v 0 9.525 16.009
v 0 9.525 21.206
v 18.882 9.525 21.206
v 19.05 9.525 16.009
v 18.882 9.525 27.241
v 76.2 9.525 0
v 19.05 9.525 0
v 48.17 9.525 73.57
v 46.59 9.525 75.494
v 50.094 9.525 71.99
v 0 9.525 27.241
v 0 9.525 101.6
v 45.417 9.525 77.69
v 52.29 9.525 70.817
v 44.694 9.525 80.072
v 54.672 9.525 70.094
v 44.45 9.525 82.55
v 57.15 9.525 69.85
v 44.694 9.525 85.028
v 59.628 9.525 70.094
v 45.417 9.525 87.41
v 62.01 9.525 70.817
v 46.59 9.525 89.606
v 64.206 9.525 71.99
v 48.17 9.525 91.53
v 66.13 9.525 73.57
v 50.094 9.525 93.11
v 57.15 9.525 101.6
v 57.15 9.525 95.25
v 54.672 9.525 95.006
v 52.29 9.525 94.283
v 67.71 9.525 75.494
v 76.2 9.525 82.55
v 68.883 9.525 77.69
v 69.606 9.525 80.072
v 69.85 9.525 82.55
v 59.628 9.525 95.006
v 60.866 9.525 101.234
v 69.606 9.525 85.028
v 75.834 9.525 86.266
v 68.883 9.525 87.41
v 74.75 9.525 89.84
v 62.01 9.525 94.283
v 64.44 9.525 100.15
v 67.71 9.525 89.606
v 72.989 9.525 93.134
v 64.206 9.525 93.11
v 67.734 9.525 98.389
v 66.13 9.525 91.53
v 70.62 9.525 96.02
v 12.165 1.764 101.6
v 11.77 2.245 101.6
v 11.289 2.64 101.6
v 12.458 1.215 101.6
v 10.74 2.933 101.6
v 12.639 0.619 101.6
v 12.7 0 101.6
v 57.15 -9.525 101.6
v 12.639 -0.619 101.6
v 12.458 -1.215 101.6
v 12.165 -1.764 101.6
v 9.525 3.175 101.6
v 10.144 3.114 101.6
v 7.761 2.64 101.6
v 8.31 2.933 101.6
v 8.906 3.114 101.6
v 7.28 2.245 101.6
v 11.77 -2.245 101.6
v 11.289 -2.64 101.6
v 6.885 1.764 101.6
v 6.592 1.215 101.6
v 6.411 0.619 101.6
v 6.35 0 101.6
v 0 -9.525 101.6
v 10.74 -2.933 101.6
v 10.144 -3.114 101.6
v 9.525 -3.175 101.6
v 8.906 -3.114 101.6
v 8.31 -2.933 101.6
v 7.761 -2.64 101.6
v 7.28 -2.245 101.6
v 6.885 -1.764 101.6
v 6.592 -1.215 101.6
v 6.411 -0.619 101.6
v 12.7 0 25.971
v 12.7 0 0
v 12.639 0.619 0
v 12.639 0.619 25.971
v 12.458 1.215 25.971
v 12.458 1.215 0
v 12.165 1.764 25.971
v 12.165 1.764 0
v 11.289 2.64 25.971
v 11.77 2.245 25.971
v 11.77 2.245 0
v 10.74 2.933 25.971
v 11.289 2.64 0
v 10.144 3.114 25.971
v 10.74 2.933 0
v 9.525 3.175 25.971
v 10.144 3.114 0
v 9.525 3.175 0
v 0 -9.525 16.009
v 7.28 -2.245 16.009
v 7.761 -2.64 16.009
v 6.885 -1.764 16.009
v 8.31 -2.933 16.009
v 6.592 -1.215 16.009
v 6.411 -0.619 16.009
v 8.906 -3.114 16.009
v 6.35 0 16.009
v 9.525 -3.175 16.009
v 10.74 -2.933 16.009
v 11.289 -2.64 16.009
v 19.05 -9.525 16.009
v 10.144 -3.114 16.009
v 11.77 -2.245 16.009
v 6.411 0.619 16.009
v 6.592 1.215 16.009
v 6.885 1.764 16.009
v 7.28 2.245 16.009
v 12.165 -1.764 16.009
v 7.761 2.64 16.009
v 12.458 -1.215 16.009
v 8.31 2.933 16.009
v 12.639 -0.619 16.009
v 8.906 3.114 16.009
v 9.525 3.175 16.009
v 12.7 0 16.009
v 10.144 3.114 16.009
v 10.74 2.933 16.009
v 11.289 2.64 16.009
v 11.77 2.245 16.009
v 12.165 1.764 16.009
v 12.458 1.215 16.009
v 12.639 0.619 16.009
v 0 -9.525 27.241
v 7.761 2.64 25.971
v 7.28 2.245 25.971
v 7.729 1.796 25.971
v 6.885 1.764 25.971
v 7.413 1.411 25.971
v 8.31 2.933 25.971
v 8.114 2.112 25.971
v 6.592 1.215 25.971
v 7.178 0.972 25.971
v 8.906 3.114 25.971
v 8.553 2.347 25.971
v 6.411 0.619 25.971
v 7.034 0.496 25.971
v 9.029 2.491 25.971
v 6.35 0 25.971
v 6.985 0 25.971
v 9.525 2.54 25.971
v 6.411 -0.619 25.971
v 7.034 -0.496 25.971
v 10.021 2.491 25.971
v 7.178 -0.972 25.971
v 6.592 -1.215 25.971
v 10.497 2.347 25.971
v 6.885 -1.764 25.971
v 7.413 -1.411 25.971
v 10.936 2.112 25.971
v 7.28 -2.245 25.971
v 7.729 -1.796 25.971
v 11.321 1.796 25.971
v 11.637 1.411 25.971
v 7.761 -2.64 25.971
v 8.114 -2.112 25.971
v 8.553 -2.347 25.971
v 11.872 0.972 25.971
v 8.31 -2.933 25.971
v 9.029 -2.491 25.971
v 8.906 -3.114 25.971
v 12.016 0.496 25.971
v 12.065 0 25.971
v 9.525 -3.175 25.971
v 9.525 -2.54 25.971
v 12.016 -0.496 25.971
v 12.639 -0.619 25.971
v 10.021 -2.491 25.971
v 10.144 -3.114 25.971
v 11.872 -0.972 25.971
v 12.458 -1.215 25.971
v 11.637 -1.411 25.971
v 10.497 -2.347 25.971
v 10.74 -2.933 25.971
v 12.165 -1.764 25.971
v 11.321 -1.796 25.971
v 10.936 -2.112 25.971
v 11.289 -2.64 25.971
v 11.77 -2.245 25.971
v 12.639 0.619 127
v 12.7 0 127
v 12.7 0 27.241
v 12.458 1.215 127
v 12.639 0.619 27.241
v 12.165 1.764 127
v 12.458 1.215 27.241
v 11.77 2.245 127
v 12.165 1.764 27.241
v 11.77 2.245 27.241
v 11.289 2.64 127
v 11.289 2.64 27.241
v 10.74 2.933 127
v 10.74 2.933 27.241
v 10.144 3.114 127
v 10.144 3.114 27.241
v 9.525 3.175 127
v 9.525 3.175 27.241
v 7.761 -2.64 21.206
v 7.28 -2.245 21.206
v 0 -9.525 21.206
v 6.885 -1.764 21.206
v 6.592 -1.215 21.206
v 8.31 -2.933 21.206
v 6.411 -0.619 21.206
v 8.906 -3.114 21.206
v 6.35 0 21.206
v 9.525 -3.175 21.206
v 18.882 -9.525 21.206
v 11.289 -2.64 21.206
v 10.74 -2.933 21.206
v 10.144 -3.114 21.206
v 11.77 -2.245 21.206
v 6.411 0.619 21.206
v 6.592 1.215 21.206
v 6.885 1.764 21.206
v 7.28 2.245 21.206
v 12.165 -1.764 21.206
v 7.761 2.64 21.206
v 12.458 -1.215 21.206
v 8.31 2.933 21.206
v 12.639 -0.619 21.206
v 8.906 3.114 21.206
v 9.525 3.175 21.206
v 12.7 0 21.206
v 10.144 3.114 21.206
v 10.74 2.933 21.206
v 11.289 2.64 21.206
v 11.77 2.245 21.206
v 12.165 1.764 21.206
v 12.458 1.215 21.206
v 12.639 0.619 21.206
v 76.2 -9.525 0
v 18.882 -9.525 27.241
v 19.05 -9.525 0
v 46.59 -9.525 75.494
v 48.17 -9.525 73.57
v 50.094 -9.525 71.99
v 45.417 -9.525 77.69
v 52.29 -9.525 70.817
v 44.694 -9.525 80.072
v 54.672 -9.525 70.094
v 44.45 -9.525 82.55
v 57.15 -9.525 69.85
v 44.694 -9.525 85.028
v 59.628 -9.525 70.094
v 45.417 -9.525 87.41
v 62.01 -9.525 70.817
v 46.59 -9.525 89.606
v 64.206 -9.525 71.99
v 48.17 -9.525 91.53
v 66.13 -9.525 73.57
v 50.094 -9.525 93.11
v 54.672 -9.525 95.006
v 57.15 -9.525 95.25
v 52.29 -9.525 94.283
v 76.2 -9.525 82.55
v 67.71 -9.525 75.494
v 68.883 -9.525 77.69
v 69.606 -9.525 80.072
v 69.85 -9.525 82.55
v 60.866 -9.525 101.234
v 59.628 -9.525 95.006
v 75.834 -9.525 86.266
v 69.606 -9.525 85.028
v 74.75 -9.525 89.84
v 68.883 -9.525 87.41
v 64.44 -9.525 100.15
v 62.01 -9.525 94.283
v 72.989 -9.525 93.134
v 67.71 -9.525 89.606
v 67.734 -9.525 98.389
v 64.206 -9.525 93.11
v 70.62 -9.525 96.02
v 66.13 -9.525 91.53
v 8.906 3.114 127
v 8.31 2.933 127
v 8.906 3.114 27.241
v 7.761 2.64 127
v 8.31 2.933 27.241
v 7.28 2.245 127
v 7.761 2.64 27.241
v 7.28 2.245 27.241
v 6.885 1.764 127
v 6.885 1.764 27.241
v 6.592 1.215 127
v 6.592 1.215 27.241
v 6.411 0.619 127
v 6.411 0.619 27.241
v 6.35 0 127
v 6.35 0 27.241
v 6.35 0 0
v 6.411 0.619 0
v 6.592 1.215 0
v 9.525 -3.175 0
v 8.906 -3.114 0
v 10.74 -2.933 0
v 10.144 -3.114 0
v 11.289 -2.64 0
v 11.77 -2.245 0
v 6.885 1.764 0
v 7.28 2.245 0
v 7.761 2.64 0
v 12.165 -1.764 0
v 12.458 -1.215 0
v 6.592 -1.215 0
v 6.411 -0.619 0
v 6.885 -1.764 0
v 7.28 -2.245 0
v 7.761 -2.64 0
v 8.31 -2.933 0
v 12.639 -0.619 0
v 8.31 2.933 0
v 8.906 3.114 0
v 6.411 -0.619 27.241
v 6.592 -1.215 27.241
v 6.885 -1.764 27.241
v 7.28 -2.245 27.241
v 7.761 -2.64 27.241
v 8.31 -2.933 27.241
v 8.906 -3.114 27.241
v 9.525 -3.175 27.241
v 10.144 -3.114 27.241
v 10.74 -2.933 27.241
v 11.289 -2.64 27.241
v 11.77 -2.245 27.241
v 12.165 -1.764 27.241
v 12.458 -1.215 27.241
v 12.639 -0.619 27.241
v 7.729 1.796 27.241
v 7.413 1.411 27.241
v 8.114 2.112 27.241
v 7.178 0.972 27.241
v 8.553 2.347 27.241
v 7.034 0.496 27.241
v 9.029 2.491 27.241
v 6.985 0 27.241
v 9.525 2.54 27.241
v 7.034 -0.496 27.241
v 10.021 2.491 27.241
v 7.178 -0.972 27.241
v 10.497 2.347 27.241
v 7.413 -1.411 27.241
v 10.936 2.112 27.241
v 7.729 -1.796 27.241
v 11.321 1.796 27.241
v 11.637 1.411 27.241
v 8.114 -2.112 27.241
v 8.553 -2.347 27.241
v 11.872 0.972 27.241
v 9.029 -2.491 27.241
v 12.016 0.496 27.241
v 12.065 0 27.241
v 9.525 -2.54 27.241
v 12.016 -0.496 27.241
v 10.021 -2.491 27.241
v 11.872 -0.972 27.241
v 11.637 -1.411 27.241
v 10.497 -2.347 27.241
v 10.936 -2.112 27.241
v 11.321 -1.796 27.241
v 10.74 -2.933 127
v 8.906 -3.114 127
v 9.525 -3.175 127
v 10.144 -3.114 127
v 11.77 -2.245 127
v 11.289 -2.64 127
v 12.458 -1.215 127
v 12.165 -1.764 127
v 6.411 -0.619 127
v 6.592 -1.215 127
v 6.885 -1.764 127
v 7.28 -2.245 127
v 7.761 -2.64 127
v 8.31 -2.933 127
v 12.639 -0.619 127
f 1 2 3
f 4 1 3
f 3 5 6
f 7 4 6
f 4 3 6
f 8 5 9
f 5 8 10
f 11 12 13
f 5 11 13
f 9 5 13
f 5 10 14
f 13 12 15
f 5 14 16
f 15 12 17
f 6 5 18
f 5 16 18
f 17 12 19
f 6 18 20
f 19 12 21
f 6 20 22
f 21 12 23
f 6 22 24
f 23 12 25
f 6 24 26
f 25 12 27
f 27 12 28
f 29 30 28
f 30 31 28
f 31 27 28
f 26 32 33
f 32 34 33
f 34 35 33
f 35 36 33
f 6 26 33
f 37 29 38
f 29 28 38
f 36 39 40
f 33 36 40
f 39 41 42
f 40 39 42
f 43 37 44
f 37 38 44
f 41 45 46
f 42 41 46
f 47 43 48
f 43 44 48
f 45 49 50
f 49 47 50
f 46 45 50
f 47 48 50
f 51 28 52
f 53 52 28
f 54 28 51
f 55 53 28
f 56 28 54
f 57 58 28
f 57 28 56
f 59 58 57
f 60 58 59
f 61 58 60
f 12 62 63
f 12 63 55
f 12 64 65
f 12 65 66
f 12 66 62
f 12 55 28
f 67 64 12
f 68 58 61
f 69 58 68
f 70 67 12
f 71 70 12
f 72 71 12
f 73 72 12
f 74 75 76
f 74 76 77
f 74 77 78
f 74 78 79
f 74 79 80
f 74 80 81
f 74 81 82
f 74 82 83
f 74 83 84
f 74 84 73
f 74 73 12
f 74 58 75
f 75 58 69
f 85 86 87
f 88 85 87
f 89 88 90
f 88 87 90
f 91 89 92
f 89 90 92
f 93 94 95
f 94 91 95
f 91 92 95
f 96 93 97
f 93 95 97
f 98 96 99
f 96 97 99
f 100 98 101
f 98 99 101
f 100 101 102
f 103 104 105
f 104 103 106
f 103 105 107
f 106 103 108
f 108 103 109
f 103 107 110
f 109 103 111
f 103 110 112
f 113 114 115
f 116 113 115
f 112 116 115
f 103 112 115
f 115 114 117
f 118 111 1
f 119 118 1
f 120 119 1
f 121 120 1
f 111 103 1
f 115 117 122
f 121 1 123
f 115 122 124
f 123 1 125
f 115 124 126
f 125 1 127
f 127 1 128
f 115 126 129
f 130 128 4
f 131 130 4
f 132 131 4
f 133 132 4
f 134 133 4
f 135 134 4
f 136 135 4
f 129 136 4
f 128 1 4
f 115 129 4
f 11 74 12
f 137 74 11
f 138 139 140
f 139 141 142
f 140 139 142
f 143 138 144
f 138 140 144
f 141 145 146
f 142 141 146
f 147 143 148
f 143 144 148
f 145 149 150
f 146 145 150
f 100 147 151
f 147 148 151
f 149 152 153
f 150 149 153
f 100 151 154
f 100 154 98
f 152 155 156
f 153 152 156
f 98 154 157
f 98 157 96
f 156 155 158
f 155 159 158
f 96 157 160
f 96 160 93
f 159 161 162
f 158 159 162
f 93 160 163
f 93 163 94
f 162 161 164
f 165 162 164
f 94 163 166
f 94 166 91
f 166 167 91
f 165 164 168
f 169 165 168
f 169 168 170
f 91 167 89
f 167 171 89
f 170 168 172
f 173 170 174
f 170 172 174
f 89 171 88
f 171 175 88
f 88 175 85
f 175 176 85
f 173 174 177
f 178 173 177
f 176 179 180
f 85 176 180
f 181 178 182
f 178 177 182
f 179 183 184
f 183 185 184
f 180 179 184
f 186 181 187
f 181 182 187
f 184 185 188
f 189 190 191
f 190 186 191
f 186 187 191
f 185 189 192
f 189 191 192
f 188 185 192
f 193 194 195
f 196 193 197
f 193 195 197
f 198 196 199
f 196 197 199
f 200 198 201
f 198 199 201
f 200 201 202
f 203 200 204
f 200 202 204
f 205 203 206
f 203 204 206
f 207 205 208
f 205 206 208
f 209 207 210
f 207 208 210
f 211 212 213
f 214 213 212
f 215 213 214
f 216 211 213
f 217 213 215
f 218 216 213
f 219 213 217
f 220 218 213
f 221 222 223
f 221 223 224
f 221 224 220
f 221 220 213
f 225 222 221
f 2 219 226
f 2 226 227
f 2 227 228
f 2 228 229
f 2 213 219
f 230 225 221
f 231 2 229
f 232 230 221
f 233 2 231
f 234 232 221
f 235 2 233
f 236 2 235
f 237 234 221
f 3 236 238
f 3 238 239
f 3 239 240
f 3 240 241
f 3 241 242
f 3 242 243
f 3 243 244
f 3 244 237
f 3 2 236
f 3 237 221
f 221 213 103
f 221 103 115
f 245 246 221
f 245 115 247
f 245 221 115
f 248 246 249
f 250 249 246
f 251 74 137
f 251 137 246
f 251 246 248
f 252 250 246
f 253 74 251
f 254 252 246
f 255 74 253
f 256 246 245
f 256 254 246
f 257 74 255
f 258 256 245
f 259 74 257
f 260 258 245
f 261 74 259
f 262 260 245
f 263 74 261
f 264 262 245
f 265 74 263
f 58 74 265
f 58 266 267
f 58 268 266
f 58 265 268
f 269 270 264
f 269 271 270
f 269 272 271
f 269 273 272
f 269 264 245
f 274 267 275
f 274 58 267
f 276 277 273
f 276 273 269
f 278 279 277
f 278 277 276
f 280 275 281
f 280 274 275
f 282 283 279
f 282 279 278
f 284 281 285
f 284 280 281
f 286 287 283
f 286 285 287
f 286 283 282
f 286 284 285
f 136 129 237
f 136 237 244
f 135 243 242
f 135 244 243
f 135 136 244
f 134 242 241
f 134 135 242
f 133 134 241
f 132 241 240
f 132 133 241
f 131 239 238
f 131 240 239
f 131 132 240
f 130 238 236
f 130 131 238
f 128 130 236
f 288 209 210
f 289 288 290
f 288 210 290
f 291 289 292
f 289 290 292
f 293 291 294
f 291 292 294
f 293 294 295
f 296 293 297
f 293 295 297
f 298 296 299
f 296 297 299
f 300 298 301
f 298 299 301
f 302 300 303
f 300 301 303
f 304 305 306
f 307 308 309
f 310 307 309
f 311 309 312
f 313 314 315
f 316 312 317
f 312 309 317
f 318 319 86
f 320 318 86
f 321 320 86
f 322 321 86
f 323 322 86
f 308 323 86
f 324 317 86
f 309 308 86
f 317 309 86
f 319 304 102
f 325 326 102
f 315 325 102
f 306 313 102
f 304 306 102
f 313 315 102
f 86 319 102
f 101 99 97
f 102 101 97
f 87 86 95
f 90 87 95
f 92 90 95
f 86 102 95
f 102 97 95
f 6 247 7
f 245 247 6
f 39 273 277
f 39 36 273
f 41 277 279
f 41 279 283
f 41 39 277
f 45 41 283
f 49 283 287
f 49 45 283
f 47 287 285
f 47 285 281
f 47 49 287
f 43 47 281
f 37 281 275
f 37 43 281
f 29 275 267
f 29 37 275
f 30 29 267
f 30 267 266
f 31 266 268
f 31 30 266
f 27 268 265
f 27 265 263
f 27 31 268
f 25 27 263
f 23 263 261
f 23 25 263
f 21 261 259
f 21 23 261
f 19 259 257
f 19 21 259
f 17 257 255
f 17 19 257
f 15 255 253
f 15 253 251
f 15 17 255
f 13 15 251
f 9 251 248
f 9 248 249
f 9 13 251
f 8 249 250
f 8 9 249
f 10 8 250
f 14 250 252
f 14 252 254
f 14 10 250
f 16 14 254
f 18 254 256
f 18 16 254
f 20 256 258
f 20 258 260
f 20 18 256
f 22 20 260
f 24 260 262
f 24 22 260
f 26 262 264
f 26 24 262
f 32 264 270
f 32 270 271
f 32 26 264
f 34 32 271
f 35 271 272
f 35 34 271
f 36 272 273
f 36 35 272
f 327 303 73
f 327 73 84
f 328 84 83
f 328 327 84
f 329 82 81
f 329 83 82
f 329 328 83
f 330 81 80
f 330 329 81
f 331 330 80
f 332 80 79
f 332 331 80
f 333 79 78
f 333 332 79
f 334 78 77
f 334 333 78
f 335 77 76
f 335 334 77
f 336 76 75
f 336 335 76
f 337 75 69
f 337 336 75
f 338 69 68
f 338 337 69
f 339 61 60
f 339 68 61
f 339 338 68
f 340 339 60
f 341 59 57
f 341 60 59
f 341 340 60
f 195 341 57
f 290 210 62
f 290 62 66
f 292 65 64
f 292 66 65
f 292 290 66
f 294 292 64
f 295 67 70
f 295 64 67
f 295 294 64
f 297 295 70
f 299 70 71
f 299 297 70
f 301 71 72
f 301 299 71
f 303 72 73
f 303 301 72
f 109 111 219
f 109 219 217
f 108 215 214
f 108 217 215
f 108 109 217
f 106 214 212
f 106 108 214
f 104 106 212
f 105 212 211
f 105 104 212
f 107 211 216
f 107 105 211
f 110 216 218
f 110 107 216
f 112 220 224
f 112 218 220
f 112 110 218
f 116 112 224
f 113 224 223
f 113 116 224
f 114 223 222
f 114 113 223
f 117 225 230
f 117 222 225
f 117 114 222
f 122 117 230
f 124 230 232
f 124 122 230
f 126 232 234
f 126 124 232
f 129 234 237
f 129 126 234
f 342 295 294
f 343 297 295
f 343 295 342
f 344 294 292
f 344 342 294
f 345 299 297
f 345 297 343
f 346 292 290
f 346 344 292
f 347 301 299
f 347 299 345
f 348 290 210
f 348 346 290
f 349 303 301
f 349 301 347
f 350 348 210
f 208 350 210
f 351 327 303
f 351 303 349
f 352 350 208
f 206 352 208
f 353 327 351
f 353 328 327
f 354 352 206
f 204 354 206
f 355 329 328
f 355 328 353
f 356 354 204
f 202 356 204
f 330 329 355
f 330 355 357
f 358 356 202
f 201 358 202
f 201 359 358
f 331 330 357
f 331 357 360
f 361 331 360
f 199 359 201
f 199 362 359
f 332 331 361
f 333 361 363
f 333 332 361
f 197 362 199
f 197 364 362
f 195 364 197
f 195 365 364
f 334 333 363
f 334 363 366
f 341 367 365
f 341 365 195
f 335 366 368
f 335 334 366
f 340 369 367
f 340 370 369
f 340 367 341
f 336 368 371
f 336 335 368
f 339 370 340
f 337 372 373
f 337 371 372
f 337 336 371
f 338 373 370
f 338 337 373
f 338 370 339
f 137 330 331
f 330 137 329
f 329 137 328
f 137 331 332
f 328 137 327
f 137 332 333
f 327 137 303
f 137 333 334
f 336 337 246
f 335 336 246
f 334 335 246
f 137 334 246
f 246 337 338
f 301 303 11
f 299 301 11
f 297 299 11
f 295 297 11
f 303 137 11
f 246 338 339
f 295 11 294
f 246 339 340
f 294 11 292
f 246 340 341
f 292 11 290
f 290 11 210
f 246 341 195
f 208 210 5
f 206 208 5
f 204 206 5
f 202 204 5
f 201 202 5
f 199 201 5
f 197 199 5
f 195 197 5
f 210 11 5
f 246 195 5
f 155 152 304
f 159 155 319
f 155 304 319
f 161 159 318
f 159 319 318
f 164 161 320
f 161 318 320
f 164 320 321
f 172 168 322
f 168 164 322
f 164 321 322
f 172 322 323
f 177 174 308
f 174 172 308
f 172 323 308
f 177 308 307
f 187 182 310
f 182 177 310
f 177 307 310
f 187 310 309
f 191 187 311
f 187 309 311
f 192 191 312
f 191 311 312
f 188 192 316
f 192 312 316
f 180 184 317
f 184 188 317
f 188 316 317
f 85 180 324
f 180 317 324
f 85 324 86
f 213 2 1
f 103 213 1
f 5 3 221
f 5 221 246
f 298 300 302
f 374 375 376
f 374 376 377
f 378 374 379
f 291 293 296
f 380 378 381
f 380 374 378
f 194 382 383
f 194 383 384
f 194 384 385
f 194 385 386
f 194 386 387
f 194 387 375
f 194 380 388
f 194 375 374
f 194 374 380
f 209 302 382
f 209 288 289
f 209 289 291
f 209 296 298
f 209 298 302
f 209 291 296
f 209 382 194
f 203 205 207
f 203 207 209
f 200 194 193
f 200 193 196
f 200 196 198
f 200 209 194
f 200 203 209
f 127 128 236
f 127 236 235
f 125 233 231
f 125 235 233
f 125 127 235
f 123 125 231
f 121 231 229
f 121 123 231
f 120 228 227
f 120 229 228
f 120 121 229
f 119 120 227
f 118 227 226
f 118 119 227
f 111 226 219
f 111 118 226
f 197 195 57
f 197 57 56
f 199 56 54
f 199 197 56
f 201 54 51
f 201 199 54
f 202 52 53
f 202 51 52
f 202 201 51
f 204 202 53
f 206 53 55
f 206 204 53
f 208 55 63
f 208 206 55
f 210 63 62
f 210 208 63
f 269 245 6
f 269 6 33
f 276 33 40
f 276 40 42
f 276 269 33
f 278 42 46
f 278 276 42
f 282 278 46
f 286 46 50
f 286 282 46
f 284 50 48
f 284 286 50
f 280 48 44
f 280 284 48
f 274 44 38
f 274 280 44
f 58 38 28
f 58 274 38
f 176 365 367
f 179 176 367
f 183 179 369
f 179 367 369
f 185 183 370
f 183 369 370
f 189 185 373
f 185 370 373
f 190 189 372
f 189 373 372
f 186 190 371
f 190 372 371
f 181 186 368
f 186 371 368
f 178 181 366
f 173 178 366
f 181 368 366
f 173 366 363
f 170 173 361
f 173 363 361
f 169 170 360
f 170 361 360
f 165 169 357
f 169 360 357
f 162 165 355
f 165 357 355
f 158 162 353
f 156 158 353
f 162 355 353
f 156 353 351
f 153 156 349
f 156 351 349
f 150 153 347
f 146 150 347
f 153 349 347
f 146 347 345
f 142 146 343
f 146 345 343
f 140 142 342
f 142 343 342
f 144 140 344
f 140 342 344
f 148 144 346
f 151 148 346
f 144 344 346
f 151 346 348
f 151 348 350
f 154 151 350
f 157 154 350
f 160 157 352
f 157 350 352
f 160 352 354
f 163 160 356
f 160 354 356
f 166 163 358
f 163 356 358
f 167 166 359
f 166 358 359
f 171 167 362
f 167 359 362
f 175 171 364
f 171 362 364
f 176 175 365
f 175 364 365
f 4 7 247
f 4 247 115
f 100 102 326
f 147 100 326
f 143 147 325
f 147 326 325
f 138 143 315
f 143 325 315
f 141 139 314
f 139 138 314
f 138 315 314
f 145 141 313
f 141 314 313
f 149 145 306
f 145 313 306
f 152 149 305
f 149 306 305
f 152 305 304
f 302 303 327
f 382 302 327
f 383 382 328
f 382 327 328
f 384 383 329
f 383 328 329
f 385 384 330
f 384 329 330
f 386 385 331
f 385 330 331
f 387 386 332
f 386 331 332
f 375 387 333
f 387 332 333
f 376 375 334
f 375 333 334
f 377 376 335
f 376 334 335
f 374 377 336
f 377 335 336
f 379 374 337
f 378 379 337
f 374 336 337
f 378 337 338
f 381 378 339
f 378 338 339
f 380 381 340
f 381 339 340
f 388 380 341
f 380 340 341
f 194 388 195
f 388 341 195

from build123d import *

# Parameters (mm, degrees)
F0_R          = 12.7
F1_DEPTH      = 9.525
F2_W          = 19.05
F2_H          = 16.0092996487
F2_W_2        = 18.8823488869
F2_H_2        = 6.0349201819
F3_DEPTH      = 9.526
F3_DEPTH_BACK = 9.526
F5_DEPTH      = 101.601
F6_DEPTH      = 127
F7_R          = 3.175
F7_R_2        = 2.54
F8_DEPTH      = 1.27


with BuildPart() as f1:
    # F0 (on Front) → F1 (new body, symmetric)
    with BuildSketch(Plane.XZ):
        with BuildLine():
            Line((0, 101.6), (0, 0))
            Line((0, 0), (76.2, 0))
            Line((76.2, 0), (76.2, 82.55))
            ThreePointArc((76.2, 82.55), (70.6203841816, 96.0203841816), (57.15, 101.6))
            Line((57.15, 101.6), (0, 101.6))
        make_face()
        with Locations((57.15, 82.55)):
            Circle(F0_R, mode=Mode.SUBTRACT)
    extrude(amount=F1_DEPTH, both=True)

    # F2 (on Front) → F3 (cut, two sides)
    with BuildSketch(Plane.XZ) as f3_sk:
        with Locations((9.525, 8.0046498244)):
            Rectangle(F2_W, F2_H)
        with Locations((9.4411744435, 24.2234951582)):
            Rectangle(F2_W_2, F2_H_2)
    extrude(amount=-F3_DEPTH, mode=Mode.SUBTRACT)
    extrude(f3_sk.sketch, amount=F3_DEPTH_BACK, mode=Mode.SUBTRACT)

    # F4 (on Top) → F5 (cut, through all)
    with BuildSketch(Plane.XY):
        with BuildLine():
            ThreePointArc((6.35, 0), (9.525, -3.175), (12.7, 0))
            ThreePointArc((12.7, 0), (11.7700640303, 2.2450640303), (9.525, 3.175))
            Line((9.525, 3.175), (9.525, 0))
            Line((9.525, 0), (6.35, 0))
        make_face()
        with BuildLine():
            Line((9.525, 0), (9.525, 3.175))
            ThreePointArc((9.525, 3.175), (7.2799359697, 2.2450640303), (6.35, 0))
            Line((6.35, 0), (9.525, 0))
        make_face()
    extrude(amount=F5_DEPTH, mode=Mode.SUBTRACT)


with BuildPart() as f6:
    # F4 (on Top) → F6 (new body)
    with BuildSketch(Plane.XY):
        with BuildLine():
            ThreePointArc((6.35, 0), (9.525, -3.175), (12.7, 0))
            ThreePointArc((12.7, 0), (11.7700640303, 2.2450640303), (9.525, 3.175))
            Line((9.525, 3.175), (9.525, 0))
            Line((9.525, 0), (6.35, 0))
        make_face()
        with BuildLine():
            Line((9.525, 0), (9.525, 3.175))
            ThreePointArc((9.525, 3.175), (7.2799359697, 2.2450640303), (6.35, 0))
            Line((6.35, 0), (9.525, 0))
        make_face()
    extrude(amount=F6_DEPTH)

    # F7 (on face) → F8 (cut)
    with BuildSketch(Plane(origin=(0, 0, 27.2409552492), x_dir=(1, 0, 0), z_dir=(0, 0, -1))):
        with Locations((9.525, 0)):
            Circle(F7_R)
        with Locations((9.525, 0)):
            Circle(F7_R_2, mode=Mode.SUBTRACT)
    extrude(amount=F8_DEPTH, mode=Mode.SUBTRACT)


solid = Compound([f1.part, f6.part])
